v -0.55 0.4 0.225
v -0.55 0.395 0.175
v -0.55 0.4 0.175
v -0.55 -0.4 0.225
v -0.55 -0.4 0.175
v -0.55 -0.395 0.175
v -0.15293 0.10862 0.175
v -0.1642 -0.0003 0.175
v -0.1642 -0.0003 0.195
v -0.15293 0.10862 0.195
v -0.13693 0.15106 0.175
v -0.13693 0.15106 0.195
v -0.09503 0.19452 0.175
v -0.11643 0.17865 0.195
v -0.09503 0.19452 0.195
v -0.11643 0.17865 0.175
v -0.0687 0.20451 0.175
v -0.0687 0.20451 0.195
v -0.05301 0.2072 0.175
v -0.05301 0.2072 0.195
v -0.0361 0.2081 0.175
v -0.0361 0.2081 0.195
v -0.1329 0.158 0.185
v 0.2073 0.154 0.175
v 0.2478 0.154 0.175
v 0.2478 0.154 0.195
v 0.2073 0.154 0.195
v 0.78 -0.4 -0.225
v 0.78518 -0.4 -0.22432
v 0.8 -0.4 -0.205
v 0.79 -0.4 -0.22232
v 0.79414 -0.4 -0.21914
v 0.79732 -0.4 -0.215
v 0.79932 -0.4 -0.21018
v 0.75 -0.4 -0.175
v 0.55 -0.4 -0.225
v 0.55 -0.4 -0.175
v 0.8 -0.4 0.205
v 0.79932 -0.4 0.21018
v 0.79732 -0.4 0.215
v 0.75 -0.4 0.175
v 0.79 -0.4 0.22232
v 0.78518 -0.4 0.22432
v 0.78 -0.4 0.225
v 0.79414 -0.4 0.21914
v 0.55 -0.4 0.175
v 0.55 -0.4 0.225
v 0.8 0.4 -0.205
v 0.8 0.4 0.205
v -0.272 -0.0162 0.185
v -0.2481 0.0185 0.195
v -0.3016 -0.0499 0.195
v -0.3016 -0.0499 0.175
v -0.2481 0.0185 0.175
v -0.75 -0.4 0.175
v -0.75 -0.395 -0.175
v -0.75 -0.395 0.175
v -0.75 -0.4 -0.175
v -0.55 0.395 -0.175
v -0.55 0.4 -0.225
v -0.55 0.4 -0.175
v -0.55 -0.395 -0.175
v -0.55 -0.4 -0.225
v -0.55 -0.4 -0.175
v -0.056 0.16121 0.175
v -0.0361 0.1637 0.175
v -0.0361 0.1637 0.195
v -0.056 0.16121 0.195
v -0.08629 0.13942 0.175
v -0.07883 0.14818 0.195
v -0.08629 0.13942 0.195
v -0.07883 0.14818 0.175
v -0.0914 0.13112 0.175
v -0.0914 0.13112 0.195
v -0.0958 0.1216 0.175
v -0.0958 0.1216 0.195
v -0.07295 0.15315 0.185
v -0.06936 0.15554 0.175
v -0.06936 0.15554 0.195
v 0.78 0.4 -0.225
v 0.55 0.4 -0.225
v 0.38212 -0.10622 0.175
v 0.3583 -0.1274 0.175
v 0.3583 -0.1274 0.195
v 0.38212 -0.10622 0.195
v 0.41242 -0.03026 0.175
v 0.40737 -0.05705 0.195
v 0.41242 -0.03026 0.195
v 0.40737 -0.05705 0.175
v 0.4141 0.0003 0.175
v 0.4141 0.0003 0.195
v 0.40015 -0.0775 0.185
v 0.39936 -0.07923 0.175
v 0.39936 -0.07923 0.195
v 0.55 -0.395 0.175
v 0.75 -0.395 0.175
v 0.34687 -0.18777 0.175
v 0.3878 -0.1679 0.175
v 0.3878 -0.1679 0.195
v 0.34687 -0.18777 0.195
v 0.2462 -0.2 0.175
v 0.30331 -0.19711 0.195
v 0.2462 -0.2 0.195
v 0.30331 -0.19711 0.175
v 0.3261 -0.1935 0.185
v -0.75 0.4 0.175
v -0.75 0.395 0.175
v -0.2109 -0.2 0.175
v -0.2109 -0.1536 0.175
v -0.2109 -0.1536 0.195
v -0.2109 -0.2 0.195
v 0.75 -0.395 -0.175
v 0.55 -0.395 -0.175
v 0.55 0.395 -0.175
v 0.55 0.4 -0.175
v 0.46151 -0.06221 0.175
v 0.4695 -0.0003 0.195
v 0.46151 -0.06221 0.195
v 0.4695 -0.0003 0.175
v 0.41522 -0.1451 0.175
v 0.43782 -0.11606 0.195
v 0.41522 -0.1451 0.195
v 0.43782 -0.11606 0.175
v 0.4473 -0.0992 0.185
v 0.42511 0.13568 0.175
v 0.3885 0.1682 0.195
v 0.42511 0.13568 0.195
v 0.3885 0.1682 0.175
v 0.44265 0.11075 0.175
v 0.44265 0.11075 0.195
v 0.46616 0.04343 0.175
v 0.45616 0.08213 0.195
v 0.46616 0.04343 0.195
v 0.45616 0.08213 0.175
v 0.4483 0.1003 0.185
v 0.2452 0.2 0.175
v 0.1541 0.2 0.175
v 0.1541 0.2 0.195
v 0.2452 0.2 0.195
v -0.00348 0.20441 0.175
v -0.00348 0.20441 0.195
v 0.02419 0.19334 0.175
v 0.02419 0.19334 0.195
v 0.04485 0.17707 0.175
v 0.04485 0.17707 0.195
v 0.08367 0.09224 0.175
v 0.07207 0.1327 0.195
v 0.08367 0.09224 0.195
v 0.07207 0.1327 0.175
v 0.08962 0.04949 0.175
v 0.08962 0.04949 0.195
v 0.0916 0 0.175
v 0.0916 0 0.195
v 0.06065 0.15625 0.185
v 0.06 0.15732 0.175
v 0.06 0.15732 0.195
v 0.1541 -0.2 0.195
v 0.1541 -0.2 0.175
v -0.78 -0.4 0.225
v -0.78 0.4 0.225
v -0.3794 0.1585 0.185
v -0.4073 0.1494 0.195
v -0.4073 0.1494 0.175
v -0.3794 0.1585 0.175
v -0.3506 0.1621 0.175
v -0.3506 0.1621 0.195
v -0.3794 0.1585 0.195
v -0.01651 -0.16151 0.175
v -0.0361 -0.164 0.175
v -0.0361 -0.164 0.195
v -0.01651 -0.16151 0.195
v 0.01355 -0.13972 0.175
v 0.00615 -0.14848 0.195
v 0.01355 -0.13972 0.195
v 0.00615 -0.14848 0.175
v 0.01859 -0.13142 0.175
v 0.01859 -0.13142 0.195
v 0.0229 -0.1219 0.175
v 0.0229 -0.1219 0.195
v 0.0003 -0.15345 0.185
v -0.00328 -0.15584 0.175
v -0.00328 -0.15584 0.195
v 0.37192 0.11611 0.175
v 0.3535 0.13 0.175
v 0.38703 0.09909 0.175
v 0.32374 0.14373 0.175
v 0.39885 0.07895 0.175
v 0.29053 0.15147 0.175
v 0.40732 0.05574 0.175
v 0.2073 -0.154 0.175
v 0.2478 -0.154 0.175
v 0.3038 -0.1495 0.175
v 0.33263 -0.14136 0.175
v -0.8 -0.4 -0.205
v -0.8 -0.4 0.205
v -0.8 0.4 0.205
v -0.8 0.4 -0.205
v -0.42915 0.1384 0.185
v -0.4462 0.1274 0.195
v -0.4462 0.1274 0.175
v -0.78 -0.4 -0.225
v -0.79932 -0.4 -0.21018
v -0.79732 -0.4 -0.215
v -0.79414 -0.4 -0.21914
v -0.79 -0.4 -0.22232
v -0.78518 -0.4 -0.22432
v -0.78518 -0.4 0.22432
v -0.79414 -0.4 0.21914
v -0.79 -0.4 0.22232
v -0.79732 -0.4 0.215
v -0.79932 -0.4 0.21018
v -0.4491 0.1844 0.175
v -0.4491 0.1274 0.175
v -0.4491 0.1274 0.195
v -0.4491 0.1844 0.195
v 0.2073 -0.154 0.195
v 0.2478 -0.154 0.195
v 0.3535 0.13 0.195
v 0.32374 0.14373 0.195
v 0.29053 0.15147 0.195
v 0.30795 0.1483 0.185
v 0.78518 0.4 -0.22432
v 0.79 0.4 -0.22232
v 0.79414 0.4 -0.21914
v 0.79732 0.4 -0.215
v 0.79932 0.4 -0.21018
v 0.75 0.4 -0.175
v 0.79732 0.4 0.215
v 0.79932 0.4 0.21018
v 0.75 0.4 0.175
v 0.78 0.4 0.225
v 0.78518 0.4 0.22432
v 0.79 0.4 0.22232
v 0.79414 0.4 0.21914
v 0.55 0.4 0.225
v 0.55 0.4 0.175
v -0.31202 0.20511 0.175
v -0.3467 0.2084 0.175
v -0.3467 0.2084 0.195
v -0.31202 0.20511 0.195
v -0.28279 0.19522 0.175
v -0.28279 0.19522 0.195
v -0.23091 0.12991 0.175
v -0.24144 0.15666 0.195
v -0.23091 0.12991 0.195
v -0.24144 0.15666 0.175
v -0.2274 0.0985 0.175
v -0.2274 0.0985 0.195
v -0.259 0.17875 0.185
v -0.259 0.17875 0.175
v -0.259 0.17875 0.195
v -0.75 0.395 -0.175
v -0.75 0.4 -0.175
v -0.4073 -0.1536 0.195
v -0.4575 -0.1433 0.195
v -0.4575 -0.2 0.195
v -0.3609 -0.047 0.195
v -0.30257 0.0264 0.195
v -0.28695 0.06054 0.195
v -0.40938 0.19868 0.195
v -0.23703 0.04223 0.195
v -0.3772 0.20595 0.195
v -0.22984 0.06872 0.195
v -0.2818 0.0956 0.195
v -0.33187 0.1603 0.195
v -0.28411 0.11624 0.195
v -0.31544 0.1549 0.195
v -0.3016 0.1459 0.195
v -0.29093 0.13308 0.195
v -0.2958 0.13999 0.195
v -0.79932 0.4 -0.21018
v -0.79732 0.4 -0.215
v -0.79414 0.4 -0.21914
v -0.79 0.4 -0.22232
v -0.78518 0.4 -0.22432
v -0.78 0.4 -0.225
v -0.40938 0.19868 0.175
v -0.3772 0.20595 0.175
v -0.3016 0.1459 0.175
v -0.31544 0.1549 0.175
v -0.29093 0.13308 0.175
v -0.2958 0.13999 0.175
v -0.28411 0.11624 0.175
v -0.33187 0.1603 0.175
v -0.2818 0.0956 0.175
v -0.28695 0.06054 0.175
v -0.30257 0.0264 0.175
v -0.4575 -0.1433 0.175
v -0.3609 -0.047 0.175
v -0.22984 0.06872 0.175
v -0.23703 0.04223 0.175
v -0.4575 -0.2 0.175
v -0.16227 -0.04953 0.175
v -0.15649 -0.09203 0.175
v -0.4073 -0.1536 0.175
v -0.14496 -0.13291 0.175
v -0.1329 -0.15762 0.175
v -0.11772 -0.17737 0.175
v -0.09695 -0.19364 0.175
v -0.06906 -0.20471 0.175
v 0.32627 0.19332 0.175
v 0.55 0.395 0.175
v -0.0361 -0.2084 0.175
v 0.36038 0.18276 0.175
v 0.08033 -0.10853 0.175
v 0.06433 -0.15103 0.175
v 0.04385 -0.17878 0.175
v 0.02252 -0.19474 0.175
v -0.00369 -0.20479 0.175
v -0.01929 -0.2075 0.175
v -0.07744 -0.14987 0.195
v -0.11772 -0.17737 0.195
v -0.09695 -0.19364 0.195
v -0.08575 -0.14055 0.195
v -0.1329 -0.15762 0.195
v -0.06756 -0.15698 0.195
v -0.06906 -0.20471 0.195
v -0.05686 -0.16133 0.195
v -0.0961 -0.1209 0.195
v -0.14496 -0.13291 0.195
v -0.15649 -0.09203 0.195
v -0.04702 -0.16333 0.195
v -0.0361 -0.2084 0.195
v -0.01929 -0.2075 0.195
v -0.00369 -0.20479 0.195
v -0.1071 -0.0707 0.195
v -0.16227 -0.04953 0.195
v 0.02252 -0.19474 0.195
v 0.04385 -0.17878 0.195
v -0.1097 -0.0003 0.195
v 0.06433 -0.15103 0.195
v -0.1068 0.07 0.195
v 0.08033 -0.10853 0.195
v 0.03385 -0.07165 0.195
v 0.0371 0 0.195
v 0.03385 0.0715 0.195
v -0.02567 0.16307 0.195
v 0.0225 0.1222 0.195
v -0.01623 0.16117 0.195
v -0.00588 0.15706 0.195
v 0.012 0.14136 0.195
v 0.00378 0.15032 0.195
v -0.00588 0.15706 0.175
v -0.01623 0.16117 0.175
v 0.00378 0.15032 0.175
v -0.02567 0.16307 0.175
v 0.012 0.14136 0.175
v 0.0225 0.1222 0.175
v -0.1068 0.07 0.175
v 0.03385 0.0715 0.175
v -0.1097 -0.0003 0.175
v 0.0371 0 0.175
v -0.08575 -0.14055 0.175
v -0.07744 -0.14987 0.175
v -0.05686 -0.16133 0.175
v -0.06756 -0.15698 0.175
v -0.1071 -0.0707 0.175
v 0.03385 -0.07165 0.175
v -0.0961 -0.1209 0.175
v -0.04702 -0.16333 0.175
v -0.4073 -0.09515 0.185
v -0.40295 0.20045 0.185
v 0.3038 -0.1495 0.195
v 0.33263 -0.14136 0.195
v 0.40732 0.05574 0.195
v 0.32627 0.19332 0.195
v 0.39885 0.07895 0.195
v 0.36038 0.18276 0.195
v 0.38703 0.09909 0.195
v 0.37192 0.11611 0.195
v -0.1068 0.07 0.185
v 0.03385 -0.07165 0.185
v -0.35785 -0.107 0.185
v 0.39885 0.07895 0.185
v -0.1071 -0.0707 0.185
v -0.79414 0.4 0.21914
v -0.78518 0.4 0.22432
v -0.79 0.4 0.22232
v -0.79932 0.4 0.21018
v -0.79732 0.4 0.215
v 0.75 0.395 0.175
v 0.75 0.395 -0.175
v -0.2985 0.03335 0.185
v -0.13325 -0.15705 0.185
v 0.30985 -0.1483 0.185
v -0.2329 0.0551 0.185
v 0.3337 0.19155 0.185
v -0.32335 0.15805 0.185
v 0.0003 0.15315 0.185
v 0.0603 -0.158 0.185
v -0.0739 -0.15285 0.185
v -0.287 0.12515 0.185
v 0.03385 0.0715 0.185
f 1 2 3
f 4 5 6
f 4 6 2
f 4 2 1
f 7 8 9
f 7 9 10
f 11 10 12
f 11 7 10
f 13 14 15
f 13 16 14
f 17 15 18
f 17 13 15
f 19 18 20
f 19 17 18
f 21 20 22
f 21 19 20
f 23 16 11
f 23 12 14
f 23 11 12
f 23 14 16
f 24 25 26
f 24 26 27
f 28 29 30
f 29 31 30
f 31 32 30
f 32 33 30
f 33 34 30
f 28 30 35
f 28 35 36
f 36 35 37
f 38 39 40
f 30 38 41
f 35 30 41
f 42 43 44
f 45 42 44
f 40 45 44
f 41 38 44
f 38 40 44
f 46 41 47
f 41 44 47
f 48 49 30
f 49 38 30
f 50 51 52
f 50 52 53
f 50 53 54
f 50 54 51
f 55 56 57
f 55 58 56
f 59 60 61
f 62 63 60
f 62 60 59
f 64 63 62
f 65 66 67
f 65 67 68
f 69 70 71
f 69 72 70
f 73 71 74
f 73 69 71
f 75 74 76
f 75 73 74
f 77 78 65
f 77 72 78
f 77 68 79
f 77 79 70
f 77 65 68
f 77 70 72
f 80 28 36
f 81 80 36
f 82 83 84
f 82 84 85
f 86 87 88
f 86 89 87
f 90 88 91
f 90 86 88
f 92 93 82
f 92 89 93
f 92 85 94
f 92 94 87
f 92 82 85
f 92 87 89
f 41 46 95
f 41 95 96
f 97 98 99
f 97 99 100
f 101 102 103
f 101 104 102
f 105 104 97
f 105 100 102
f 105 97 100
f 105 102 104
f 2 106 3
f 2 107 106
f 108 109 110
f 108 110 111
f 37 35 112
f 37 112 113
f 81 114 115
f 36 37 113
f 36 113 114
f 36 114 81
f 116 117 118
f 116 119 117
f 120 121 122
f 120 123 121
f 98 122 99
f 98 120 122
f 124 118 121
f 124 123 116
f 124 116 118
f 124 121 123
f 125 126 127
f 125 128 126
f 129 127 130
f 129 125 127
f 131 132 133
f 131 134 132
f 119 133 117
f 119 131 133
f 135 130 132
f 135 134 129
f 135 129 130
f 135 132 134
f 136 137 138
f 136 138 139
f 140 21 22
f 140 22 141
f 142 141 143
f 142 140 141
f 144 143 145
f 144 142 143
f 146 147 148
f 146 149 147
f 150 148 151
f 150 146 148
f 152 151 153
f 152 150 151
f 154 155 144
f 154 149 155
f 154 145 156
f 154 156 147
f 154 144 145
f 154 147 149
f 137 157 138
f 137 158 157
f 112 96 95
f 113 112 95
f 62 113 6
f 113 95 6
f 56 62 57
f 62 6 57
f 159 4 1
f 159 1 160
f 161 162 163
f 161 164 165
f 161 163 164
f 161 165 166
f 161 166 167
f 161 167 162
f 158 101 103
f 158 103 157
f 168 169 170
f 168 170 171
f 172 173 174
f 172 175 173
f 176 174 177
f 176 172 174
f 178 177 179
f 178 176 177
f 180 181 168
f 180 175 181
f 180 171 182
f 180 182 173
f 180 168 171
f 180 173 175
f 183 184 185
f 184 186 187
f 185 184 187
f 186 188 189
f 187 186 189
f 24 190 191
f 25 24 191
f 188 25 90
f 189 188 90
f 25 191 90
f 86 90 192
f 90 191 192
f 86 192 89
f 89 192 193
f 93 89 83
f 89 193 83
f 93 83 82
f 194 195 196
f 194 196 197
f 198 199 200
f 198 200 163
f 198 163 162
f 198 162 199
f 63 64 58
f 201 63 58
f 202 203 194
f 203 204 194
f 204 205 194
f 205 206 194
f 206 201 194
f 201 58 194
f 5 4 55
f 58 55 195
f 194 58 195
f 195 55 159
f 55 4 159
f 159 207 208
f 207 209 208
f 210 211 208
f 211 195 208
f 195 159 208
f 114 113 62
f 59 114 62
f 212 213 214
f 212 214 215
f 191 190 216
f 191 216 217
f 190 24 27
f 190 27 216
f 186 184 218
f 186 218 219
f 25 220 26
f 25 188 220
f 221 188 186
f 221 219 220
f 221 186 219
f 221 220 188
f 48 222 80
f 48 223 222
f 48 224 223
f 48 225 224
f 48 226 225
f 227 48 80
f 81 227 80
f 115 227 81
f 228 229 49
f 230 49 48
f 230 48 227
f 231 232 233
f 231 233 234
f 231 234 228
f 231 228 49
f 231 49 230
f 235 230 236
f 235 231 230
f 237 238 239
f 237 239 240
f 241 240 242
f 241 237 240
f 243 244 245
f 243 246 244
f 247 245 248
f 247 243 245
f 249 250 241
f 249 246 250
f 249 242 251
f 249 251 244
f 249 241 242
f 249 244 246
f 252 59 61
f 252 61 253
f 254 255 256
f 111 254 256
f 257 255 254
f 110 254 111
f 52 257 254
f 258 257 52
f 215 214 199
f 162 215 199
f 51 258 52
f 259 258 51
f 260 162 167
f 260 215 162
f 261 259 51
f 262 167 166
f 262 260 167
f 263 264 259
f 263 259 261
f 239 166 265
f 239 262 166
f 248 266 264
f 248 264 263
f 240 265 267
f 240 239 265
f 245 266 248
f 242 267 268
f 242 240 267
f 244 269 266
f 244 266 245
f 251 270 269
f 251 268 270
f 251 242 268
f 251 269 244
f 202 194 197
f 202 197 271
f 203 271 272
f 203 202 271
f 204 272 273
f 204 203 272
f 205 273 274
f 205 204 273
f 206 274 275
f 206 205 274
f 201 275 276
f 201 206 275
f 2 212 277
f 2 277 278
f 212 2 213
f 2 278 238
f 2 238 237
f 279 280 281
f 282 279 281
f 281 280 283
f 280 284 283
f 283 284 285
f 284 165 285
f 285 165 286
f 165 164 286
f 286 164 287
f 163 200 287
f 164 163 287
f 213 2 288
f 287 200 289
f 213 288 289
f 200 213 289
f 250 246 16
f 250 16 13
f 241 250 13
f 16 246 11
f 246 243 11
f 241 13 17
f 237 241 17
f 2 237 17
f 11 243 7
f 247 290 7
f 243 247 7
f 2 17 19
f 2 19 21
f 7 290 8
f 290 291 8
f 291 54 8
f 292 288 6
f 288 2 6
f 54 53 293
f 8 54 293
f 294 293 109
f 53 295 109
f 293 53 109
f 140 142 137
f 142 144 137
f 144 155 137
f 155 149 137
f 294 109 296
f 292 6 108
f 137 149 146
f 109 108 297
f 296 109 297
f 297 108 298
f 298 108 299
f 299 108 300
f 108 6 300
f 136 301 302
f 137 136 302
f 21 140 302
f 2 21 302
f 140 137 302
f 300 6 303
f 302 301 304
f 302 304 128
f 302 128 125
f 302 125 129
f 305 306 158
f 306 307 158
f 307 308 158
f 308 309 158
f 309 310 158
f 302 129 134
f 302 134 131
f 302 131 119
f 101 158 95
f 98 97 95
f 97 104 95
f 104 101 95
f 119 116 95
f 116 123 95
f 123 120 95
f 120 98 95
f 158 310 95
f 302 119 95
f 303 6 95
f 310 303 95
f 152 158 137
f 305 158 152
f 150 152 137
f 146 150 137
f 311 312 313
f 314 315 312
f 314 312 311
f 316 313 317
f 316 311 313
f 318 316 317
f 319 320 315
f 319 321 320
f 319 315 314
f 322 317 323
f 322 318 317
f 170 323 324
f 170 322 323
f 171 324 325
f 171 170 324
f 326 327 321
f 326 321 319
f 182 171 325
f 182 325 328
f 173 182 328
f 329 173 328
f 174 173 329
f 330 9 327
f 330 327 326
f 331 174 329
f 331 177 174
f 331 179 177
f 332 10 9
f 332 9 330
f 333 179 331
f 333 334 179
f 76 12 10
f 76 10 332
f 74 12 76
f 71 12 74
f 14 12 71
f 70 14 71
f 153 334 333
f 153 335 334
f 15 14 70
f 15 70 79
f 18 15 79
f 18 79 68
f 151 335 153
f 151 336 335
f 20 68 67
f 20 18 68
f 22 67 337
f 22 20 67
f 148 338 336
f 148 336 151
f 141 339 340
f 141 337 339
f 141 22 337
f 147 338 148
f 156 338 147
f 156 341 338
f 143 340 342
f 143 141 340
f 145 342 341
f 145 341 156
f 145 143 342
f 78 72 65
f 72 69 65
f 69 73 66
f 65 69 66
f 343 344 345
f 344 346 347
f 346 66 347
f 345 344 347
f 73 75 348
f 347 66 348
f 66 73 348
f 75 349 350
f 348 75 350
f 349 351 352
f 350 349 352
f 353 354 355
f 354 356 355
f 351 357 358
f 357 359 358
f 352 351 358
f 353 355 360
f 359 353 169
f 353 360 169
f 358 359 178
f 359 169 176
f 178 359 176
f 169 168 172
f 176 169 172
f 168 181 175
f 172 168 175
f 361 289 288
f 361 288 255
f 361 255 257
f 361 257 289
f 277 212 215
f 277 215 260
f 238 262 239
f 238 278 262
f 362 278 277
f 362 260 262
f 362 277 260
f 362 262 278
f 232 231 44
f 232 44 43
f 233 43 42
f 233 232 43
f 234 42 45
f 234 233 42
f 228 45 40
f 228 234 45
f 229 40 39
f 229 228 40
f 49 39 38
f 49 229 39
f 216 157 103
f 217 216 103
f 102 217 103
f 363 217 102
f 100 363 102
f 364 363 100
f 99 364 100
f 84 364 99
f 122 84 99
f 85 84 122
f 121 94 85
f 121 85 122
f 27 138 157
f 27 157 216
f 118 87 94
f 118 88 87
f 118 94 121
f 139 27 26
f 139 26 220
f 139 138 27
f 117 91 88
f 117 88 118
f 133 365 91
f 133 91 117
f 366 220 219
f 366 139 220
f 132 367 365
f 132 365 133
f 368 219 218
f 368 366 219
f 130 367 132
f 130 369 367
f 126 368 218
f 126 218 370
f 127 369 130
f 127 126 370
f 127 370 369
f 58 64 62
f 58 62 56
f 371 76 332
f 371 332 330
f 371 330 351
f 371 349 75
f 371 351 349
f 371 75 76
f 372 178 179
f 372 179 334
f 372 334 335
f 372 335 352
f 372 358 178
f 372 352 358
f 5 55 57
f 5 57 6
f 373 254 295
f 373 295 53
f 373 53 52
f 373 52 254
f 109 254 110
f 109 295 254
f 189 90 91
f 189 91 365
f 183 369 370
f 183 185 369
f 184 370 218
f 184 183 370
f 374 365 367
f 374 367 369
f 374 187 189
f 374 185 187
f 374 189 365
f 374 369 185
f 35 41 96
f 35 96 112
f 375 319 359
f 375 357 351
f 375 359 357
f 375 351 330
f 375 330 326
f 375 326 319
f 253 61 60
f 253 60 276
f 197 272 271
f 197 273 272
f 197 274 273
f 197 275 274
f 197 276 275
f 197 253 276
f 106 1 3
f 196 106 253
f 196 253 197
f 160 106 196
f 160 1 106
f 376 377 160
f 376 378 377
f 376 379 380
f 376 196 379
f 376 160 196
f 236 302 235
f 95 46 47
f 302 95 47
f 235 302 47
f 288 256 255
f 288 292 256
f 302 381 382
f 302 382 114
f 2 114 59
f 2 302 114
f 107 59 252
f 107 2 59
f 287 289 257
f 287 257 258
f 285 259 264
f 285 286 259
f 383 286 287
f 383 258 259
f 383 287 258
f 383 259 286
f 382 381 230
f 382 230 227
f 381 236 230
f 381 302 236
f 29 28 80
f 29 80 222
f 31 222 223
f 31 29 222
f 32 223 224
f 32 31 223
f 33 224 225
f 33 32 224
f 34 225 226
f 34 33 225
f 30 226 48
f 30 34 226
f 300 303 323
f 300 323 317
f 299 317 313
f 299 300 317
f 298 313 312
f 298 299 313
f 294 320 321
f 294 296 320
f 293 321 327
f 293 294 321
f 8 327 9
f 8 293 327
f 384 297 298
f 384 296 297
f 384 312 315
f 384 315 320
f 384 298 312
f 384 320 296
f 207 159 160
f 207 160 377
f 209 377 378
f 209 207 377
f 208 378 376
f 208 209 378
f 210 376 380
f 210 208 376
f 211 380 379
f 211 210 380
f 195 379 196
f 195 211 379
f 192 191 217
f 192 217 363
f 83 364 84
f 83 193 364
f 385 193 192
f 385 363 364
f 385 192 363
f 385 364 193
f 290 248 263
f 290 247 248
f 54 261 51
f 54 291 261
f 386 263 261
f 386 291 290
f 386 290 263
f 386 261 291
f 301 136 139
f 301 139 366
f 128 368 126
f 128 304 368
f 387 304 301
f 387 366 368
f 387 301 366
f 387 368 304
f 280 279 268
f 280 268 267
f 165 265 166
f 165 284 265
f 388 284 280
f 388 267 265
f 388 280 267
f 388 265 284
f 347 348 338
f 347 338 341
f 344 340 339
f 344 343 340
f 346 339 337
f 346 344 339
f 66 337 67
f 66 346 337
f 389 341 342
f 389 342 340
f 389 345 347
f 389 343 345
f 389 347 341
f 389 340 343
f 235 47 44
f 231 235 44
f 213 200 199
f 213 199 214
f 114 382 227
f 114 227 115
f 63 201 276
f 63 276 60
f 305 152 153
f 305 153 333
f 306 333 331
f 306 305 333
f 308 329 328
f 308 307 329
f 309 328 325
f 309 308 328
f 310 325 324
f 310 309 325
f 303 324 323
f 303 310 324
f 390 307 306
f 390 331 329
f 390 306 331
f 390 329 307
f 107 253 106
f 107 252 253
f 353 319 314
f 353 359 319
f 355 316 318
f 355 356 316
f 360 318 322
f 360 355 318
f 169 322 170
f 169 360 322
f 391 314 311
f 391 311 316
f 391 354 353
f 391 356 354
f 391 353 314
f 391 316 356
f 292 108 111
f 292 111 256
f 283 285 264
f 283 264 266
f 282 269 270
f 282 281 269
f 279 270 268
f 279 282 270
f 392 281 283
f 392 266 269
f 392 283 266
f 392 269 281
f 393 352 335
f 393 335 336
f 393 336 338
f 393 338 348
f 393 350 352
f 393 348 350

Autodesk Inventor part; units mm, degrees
ref_plane "YZ Plane" through (0, 0, 0) normal (1, 0, 0) x (0, 1, 0)
ref_plane "XZ Plane" through (0, 0, 0) normal (0, 1, 0) x (-1, 0, 0)
ref_plane "XY Plane" through (0, 0, 0) normal (0, 0, 1) x (1, 0, 0)
sketch "Sketch1" plane through (0, 0, 0) normal (0, 1, 0) x (-1, 0, 0)
  line L0 (0.75, 0.175) -> (-0.75, 0.175)
  line L1 (-0.75, 0.175) -> (-0.75, -0.175)
  line L2 (-0.75, -0.175) -> (0.75, -0.175)
  line L3 (0.75, -0.175) -> (0.75, 0.175)
  line L4 (0.55, 0.175) -> (0.55, 0.225)
  line L5 (0.55, 0.225) -> (0.8, 0.225)
  line L6 (0.8, 0.225) -> (0.8, -0.225)
  line L7 (0.8, -0.225) -> (0.55, -0.225)
  line L8 (0.55, -0.225) -> (0.55, -0.175)
  line L9 (-0.55, 0.175) -> (-0.55, 0.225)
  line L10 (-0.55, 0.225) -> (-0.8, 0.225)
  line L11 (-0.8, 0.225) -> (-0.8, -0.225)
  line L12 (-0.8, -0.225) -> (-0.55, -0.225)
  line L13 (-0.55, -0.175) -> (-0.55, -0.225)
  line L14 (0.55, 0.175) -> (-0.55, 0.175)
  point P0 (0, 0)
  point P1 (0, 0.175)
  point P2 (0.75, 0)
  dimension "d0" = 1.6
  dimension "d1" = 0.05
  dimension "d2" = 0.05
  dimension "d3" = 0.45
  dimension "d4" = 0.25
extrude "Extrusion1" add sketch "Sketch1" along normal mid plane 0.8 contours L0 L4 L5 L6 L7 L8 L2 L3 | L0 L1 L2 L13 L12 L11 L10 L9
extrude "Extrusion2" add sketch "Sketch1" along normal mid plane 0.79 contours L3 L2 L1 L0
sketch "Sketch2" plane through (-0.55, -0.395, 0.175) normal (0, 0, 1) x (1, 0, 0)
  line L0 (0, 0) -> (0, 0.79) projected
  line L1 (1.1, 0) -> (0, 0) projected
  line L2 (1.1, 0) -> (1.1, 0.79) projected
  line L3 (0, 0.79) -> (1.1, 0.79) projected
  line L4 (0, 0.395) -> (1.1, 0.395) construction
  line L5 (0.3391, 0.195) -> (0.0925, 0.195)
  line L6 (0.0925, 0.195) -> (0.0925, 0.2517)
  spline S0 degree 2 poles (0.0925, 0.2517) (0.119, 0.2767) (0.1664, 0.323) (0.1891, 0.348) knots 0 0 0 1 2 2 2
  spline S1 degree 2 poles (0.1891, 0.348) (0.2348, 0.3982) (0.2682, 0.4585) (0.2682, 0.4906) knots 0 0 0 1 2 2 2
  spline S2 degree 2 poles (0.2682, 0.4906) (0.2682, 0.5075) (0.2578, 0.5328) (0.2484, 0.5409) knots 0 0 0 1 2 2 2
  spline S3 degree 2 poles (0.2484, 0.5409) (0.239, 0.549) (0.2143, 0.5571) (0.1994, 0.5571) knots 0 0 0 1 2 2 2
  spline S4 degree 2 poles (0.1994, 0.5571) (0.1852, 0.5571) (0.156, 0.5499) (0.1427, 0.5444) knots 0 0 0 1 2 2 2
  spline S5 degree 2 poles (0.1427, 0.5444) (0.1314, 0.5399) (0.1103, 0.5269) (0.1038, 0.5224) knots 0 0 0 1 2 2 2
  line L7 (0.1038, 0.5224) -> (0.1009, 0.5224)
  line L8 (0.1009, 0.5224) -> (0.1009, 0.5794)
  spline S6 degree 2 poles (0.1009, 0.5794) (0.1174, 0.5875) (0.1767, 0.6034) (0.2033, 0.6034) knots 0 0 0 1 2 2 2
  spline S7 degree 2 poles (0.2033, 0.6034) (0.2594, 0.6034) (0.3226, 0.5441) (0.3226, 0.4935) knots 0 0 0 1 2 2 2
  spline S8 degree 2 poles (0.3226, 0.4935) (0.3226, 0.4699) (0.3116, 0.4303) (0.3019, 0.4135) knots 0 0 0 1 2 2 2
  spline S9 degree 2 poles (0.3019, 0.4135) (0.2921, 0.396) (0.2639, 0.3616) (0.2484, 0.3451) knots 0 0 0 1 2 2 2
  spline S10 degree 2 poles (0.2484, 0.3451) (0.2231, 0.3175) (0.1612, 0.2585) (0.1427, 0.2414) knots 0 0 0 1 2 2 2
  line L9 (0.1427, 0.2414) -> (0.3391, 0.2414)
  line L10 (0.3391, 0.2414) -> (0.3391, 0.195)
  spline S11 degree 2 poles (0.6416, 0.395) (0.6416, 0.2874) (0.579, 0.1866) (0.5139, 0.1866) knots 0 0 0 1 2 2 2
  spline S12 degree 2 poles (0.5139, 0.1866) (0.4477, 0.1866) (0.3858, 0.2893) (0.3858, 0.3947) knots 0 0 0 1 2 2 2
  spline S13 degree 2 poles (0.3858, 0.3947) (0.3858, 0.5029) (0.4484, 0.6031) (0.5139, 0.6031) knots 0 0 0 1 2 2 2
  spline S14 degree 2 poles (0.5139, 0.6031) (0.5797, 0.6031) (0.6416, 0.4994) (0.6416, 0.395) knots 0 0 0 1 2 2 2
  spline S15 degree 2 poles (0.5729, 0.2731) (0.5806, 0.2929) (0.5871, 0.3538) (0.5871, 0.395) knots 0 0 0 1 2 2 2
  spline S16 degree 2 poles (0.5871, 0.395) (0.5871, 0.4362) (0.5806, 0.4968) (0.5725, 0.5172) knots 0 0 0 1 2 2 2
  spline S17 degree 2 poles (0.5725, 0.5172) (0.5644, 0.5376) (0.5362, 0.5587) (0.5139, 0.5587) knots 0 0 0 1 2 2 2
  spline S18 degree 2 poles (0.5139, 0.5587) (0.4915, 0.5587) (0.4626, 0.5376) (0.4542, 0.5166) knots 0 0 0 1 2 2 2
  spline S19 degree 2 poles (0.4542, 0.5166) (0.4461, 0.4961) (0.4403, 0.4339) (0.4403, 0.3947) knots 0 0 0 1 2 2 2
  spline S20 degree 2 poles (0.4403, 0.3947) (0.4403, 0.3525) (0.4455, 0.2961) (0.4539, 0.2741) knots 0 0 0 1 2 2 2
  spline S21 degree 2 poles (0.4539, 0.2741) (0.4617, 0.2533) (0.4905, 0.231) (0.5139, 0.231) knots 0 0 0 1 2 2 2
  spline S22 degree 2 poles (0.5139, 0.231) (0.5359, 0.231) (0.5647, 0.2521) (0.5729, 0.2731) knots 0 0 0 1 2 2 2
  spline S23 degree 2 poles (1.0195, 0.3947) (1.0195, 0.3399) (0.9751, 0.2517) (0.9378, 0.2271) knots 0 0 0 1 2 2 2
  spline S24 degree 2 poles (0.9378, 0.2271) (0.9074, 0.208) (0.8448, 0.195) (0.7962, 0.195) knots 0 0 0 1 2 2 2
  line L11 (0.7962, 0.195) -> (0.7041, 0.195)
  line L12 (0.7041, 0.195) -> (0.7041, 0.595)
  line L13 (0.7041, 0.595) -> (0.7952, 0.595)
  spline S25 degree 2 poles (0.7952, 0.595) (0.8516, 0.595) (0.9158, 0.5781) (0.9385, 0.5632) knots 0 0 0 1 2 2 2
  spline S26 degree 2 poles (0.9385, 0.5632) (0.9771, 0.5376) (1.0195, 0.453) (1.0195, 0.3947) knots 0 0 0 1 2 2 2
  spline S27 degree 2 poles (0.9641, 0.3953) (0.9641, 0.4414) (0.9336, 0.5065) (0.9035, 0.525) knots 0 0 0 1 2 2 2
  spline S28 degree 2 poles (0.9035, 0.525) (0.8821, 0.5376) (0.8338, 0.549) (0.7978, 0.549) knots 0 0 0 1 2 2 2
  line L14 (0.7978, 0.549) -> (0.7573, 0.549)
  line L15 (0.7573, 0.549) -> (0.7573, 0.241)
  line L16 (0.7573, 0.241) -> (0.7978, 0.241)
  spline S29 degree 2 poles (0.7978, 0.241) (0.8331, 0.241) (0.8866, 0.2524) (0.9083, 0.2676) knots 0 0 0 1 2 2 2
  spline S30 degree 2 poles (0.9083, 0.2676) (0.9362, 0.2864) (0.9641, 0.3486) (0.9641, 0.3953) knots 0 0 0 1 2 2 2
  point P0 (0.55, 0.395)
extrude "Extrusion3" add sketch "Sketch2" along normal blind 0.02 contours L5 L6 S0 S1 S2 S3 S4 S5 L7 L8 S6 S7 S8 S9 S10 L9 L10 | S11 S12 S13 S14 | S23 S24 L11 L12 L13 S25 S26
fillet "Fillet1" radius 0.02 4 edges at (-0.8, 0, 0.225) (-0.8, 0, -0.225) (0.8, 0, 0.225) (0.8, 0, -0.225)
equation "\"d2\" = d1"
properties part number "21-1001" material "Copper"
